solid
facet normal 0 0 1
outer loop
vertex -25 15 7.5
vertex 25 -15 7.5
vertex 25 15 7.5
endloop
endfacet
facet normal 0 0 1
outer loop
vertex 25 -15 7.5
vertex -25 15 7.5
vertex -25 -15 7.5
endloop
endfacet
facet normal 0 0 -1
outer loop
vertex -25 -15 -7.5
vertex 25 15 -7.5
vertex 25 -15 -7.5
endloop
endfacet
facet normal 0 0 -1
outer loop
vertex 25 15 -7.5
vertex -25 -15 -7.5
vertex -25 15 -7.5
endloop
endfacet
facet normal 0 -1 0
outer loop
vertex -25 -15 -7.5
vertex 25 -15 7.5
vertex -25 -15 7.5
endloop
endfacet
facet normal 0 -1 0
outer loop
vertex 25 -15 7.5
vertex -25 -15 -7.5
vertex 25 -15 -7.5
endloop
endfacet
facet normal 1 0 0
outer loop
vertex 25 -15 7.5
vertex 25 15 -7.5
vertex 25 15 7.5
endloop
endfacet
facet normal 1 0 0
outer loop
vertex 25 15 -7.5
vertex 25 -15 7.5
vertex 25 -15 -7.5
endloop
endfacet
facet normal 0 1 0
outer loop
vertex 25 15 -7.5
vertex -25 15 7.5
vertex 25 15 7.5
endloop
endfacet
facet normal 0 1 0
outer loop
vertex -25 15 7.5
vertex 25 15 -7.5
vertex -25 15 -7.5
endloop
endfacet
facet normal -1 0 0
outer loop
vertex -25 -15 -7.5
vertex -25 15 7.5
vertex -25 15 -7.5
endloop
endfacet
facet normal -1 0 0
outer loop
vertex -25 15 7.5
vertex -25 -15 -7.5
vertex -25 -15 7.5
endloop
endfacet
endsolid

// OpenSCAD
// Parameters
body_length = 50; //[25:100:1]
body_width = 30; //[15:60:1]
body_height = 15; //[8:30:1]

// Main Body
module main_body() {
  color("Silver") // Use a neutral color for the main body
  cube([body_length, body_width, body_height], center=true);
}

// Final Component
module component_union() {
  union() {
    main_body();
  }
}

// Render the final component
component_union();
